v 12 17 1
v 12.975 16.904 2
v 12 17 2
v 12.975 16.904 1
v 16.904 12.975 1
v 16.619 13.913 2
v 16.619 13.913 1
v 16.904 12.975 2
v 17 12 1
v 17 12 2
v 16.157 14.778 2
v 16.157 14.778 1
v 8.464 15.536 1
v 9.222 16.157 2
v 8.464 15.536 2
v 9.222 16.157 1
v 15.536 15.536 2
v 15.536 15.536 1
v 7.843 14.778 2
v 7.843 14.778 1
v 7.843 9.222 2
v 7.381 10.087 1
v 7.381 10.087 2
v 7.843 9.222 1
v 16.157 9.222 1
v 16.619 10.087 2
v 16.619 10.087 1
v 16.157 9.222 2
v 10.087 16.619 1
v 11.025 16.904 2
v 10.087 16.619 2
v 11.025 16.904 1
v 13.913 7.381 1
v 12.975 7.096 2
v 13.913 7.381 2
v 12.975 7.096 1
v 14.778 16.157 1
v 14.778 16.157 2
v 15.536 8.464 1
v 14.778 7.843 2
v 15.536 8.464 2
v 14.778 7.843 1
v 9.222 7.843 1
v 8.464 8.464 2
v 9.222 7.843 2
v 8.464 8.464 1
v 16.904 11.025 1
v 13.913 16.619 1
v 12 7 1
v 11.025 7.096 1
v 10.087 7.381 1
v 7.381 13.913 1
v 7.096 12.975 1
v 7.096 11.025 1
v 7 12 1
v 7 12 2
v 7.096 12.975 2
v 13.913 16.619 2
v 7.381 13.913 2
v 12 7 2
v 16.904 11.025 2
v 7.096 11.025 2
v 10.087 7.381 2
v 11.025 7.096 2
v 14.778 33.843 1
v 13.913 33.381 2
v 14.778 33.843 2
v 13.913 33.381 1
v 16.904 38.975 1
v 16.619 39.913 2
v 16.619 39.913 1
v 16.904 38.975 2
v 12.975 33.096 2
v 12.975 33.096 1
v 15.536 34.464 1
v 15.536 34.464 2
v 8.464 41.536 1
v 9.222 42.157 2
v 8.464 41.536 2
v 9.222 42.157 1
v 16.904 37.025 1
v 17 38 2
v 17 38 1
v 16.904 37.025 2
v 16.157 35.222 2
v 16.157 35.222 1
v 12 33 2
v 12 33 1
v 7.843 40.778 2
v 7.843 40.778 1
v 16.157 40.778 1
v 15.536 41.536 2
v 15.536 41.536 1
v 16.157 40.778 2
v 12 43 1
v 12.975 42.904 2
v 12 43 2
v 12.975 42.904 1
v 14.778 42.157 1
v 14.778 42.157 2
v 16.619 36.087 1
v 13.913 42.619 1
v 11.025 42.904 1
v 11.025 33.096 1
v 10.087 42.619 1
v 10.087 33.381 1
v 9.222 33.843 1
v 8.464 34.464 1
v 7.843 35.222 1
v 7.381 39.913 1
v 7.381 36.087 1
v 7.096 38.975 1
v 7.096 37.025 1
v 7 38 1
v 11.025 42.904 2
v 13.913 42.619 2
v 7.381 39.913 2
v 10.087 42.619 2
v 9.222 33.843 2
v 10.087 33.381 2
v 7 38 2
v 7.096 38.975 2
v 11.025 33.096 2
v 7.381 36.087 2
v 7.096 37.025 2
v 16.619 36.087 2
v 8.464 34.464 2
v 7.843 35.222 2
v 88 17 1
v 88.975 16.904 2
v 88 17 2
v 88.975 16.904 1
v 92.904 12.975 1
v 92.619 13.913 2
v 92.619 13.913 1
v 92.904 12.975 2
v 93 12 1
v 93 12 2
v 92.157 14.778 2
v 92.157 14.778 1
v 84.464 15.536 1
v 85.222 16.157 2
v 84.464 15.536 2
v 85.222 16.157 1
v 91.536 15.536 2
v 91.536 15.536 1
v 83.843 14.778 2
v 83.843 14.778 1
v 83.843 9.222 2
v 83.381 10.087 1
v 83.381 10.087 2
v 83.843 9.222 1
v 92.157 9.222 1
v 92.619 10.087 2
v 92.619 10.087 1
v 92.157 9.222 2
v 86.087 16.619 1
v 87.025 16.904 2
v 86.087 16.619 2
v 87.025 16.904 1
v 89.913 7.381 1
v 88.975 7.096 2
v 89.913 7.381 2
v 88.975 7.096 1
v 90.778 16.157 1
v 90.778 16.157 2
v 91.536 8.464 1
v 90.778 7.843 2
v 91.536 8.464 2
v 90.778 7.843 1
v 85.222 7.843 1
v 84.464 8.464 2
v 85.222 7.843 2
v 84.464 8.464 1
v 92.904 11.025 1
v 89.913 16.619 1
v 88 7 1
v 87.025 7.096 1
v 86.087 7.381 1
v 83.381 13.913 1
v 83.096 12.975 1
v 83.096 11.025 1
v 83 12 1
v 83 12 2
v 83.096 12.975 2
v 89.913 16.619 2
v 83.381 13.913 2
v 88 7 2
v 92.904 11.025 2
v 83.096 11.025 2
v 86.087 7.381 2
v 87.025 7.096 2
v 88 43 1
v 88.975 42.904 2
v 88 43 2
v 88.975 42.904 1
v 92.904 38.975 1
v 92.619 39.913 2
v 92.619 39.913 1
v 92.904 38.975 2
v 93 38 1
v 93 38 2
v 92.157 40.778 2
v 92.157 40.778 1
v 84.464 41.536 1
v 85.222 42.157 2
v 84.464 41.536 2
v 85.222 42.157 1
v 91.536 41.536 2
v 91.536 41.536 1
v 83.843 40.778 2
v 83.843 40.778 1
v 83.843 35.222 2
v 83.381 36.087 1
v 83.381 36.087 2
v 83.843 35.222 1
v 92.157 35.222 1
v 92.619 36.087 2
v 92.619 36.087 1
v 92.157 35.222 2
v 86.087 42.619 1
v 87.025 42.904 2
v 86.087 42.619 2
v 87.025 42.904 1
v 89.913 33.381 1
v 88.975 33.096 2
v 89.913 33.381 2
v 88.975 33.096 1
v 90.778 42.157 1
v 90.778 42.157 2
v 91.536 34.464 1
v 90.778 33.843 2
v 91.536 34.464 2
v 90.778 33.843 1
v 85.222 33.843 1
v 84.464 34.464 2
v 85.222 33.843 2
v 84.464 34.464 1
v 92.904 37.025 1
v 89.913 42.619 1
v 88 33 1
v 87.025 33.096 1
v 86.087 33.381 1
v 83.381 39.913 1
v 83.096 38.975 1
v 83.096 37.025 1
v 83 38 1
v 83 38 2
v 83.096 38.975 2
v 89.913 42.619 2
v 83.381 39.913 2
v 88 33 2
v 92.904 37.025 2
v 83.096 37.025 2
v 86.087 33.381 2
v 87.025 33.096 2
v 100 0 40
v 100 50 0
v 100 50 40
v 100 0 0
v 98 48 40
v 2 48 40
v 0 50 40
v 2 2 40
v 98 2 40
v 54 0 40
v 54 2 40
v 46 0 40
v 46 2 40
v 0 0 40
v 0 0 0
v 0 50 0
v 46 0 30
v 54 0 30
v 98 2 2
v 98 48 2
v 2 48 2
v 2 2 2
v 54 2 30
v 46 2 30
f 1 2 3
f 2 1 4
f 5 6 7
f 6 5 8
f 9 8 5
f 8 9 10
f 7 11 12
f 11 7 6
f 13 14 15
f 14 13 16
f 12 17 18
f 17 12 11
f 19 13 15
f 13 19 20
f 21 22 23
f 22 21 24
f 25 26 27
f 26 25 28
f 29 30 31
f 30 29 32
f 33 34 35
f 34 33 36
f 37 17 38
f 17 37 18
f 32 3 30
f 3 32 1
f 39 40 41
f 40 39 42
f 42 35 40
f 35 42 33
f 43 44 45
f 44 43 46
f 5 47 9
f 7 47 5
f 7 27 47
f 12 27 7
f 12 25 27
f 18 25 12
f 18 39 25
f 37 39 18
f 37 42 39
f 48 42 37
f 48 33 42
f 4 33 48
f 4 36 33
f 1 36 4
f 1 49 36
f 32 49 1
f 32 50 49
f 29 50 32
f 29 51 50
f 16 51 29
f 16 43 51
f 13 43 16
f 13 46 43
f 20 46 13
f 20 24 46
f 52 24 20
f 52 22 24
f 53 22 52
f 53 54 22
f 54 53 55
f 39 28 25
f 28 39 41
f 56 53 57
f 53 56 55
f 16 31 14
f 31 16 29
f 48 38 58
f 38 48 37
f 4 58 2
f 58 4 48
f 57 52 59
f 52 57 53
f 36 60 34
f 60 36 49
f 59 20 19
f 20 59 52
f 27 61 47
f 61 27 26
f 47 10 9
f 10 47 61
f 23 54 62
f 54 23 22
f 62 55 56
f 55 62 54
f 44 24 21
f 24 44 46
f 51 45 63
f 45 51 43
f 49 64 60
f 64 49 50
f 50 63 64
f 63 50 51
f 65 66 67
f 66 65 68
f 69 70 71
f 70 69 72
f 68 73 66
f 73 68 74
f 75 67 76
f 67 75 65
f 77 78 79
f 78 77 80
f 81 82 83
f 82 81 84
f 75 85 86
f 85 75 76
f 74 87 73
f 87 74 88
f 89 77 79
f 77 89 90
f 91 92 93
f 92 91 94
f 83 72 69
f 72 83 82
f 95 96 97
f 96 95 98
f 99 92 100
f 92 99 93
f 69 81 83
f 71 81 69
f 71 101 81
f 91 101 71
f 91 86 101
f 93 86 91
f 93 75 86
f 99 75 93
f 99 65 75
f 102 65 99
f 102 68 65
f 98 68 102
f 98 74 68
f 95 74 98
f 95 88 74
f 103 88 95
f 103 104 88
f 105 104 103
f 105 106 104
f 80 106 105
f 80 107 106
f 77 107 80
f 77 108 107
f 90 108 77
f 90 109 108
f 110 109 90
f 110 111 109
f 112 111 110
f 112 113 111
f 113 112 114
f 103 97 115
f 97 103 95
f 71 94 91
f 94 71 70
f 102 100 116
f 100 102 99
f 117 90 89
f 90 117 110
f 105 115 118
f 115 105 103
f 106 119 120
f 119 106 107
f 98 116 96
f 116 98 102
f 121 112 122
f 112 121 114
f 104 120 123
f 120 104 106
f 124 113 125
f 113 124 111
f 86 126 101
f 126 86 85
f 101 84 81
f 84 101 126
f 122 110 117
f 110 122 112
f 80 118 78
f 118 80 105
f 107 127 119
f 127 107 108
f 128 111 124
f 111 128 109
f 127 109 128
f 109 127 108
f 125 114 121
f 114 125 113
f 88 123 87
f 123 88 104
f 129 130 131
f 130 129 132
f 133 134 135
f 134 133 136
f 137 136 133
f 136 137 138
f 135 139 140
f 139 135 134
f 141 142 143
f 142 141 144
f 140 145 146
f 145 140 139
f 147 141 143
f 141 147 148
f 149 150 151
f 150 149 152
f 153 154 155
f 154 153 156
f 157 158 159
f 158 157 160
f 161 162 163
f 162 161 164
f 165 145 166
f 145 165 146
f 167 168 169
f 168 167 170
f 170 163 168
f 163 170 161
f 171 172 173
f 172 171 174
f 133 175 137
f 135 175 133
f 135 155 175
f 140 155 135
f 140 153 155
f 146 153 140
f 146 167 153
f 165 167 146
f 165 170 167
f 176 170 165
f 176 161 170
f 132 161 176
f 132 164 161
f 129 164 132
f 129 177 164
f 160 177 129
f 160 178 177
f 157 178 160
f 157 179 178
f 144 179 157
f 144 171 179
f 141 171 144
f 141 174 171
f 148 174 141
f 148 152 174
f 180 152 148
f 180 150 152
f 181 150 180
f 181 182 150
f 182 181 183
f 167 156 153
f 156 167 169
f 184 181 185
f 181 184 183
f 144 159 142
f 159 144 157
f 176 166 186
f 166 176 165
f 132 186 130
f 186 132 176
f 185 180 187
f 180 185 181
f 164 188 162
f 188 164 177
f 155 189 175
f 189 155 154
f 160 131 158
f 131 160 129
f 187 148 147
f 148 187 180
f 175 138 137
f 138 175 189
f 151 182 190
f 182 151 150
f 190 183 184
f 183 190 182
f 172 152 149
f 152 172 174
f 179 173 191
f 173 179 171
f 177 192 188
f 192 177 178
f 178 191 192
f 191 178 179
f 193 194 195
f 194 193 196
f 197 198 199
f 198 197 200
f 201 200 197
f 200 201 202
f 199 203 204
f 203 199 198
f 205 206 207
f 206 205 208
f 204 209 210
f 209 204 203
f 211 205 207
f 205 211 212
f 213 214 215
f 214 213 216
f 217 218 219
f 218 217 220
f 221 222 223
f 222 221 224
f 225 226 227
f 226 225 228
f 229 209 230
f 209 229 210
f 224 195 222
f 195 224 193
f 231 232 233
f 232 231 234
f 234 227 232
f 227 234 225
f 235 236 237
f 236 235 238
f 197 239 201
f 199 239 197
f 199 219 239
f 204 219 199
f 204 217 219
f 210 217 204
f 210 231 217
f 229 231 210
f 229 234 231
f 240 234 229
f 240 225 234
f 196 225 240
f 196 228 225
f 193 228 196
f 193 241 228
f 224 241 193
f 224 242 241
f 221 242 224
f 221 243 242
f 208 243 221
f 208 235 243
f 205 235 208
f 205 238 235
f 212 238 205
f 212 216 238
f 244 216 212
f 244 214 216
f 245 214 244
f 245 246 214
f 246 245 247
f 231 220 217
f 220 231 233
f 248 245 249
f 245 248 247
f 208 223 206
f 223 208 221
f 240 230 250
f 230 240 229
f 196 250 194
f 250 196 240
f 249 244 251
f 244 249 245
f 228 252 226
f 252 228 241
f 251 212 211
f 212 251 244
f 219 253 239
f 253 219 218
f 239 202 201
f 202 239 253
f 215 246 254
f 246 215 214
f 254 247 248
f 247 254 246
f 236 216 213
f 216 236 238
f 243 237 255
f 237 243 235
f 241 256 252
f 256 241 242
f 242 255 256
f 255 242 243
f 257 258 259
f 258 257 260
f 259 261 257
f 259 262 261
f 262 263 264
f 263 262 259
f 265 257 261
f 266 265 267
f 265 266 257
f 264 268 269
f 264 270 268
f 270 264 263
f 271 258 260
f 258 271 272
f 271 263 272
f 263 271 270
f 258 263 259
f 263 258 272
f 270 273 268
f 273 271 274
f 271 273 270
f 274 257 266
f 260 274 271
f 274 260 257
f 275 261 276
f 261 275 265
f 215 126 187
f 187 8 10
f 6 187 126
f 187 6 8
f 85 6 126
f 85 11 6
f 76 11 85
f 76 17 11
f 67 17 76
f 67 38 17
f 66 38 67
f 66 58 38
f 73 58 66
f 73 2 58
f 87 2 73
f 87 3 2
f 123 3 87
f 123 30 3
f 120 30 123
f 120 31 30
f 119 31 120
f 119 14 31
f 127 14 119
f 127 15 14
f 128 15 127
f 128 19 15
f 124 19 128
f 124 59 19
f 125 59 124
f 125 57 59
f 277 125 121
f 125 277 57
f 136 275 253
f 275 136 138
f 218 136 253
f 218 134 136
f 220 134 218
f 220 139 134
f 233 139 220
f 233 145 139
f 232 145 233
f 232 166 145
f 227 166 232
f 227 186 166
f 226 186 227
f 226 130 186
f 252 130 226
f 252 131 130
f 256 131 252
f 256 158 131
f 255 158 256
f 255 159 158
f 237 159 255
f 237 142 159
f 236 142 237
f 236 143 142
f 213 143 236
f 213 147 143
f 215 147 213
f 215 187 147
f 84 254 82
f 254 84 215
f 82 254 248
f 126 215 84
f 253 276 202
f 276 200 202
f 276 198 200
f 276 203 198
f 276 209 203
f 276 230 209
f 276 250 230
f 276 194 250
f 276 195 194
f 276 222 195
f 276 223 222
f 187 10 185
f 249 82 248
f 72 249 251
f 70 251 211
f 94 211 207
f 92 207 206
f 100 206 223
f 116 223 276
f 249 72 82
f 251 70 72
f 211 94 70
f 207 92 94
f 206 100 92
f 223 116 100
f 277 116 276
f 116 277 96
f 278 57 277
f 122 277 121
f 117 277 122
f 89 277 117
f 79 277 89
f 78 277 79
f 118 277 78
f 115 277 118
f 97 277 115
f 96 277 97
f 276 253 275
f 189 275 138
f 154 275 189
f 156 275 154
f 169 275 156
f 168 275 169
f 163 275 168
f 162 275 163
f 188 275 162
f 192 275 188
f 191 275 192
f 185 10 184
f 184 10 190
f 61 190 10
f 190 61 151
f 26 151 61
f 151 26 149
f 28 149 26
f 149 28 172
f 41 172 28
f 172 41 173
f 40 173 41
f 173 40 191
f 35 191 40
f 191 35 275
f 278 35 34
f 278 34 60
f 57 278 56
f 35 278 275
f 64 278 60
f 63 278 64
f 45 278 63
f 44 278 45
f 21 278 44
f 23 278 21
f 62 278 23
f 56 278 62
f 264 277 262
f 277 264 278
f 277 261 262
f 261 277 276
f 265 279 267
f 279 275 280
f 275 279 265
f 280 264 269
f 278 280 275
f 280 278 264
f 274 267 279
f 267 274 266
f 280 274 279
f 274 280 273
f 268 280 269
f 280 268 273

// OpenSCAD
$fn = 32;

// ----------------------------------------------------------------------
// Enclosure box: both enclosure
// ----------------------------------------------------------------------

// --- parameters (mm) ---
box_l = 100;              // outer length, X
box_w = 50;               // outer width, Y
box_h = 40;               // outer height
wall_t = 2;               // wall thickness
boss_r = 5;               // corner boss radius
hole_r = 1.5;             // boss screw hole radius
boss_in = 12;             // boss inset from the corners
notch_w = 8;              // cable notch width
notch_h = 10;             // cable notch height

inner_h = box_h - wall_t;  // cavity depth
boss_h = inner_h - 2;  // corner boss height

difference() {
  cube([box_l, box_w, box_h]);
  translate([wall_t, wall_t, wall_t])
    cube([box_l - 2 * wall_t, box_w - 2 * wall_t, box_h]);
  for (sx = [0, 1], sy = [0, 1])
    translate([sx ? box_l - boss_in : boss_in,
               sy ? box_w - boss_in : boss_in, wall_t - 1]) {
      cylinder(r = boss_r, h = boss_h);
      translate([0, 0, boss_h - 4])
        cylinder(r = hole_r, h = 5);
    }
  translate([box_l / 2 - notch_w / 2, -1, box_h - notch_h])
    cube([notch_w, wall_t + 2, notch_h + 1]);
}
